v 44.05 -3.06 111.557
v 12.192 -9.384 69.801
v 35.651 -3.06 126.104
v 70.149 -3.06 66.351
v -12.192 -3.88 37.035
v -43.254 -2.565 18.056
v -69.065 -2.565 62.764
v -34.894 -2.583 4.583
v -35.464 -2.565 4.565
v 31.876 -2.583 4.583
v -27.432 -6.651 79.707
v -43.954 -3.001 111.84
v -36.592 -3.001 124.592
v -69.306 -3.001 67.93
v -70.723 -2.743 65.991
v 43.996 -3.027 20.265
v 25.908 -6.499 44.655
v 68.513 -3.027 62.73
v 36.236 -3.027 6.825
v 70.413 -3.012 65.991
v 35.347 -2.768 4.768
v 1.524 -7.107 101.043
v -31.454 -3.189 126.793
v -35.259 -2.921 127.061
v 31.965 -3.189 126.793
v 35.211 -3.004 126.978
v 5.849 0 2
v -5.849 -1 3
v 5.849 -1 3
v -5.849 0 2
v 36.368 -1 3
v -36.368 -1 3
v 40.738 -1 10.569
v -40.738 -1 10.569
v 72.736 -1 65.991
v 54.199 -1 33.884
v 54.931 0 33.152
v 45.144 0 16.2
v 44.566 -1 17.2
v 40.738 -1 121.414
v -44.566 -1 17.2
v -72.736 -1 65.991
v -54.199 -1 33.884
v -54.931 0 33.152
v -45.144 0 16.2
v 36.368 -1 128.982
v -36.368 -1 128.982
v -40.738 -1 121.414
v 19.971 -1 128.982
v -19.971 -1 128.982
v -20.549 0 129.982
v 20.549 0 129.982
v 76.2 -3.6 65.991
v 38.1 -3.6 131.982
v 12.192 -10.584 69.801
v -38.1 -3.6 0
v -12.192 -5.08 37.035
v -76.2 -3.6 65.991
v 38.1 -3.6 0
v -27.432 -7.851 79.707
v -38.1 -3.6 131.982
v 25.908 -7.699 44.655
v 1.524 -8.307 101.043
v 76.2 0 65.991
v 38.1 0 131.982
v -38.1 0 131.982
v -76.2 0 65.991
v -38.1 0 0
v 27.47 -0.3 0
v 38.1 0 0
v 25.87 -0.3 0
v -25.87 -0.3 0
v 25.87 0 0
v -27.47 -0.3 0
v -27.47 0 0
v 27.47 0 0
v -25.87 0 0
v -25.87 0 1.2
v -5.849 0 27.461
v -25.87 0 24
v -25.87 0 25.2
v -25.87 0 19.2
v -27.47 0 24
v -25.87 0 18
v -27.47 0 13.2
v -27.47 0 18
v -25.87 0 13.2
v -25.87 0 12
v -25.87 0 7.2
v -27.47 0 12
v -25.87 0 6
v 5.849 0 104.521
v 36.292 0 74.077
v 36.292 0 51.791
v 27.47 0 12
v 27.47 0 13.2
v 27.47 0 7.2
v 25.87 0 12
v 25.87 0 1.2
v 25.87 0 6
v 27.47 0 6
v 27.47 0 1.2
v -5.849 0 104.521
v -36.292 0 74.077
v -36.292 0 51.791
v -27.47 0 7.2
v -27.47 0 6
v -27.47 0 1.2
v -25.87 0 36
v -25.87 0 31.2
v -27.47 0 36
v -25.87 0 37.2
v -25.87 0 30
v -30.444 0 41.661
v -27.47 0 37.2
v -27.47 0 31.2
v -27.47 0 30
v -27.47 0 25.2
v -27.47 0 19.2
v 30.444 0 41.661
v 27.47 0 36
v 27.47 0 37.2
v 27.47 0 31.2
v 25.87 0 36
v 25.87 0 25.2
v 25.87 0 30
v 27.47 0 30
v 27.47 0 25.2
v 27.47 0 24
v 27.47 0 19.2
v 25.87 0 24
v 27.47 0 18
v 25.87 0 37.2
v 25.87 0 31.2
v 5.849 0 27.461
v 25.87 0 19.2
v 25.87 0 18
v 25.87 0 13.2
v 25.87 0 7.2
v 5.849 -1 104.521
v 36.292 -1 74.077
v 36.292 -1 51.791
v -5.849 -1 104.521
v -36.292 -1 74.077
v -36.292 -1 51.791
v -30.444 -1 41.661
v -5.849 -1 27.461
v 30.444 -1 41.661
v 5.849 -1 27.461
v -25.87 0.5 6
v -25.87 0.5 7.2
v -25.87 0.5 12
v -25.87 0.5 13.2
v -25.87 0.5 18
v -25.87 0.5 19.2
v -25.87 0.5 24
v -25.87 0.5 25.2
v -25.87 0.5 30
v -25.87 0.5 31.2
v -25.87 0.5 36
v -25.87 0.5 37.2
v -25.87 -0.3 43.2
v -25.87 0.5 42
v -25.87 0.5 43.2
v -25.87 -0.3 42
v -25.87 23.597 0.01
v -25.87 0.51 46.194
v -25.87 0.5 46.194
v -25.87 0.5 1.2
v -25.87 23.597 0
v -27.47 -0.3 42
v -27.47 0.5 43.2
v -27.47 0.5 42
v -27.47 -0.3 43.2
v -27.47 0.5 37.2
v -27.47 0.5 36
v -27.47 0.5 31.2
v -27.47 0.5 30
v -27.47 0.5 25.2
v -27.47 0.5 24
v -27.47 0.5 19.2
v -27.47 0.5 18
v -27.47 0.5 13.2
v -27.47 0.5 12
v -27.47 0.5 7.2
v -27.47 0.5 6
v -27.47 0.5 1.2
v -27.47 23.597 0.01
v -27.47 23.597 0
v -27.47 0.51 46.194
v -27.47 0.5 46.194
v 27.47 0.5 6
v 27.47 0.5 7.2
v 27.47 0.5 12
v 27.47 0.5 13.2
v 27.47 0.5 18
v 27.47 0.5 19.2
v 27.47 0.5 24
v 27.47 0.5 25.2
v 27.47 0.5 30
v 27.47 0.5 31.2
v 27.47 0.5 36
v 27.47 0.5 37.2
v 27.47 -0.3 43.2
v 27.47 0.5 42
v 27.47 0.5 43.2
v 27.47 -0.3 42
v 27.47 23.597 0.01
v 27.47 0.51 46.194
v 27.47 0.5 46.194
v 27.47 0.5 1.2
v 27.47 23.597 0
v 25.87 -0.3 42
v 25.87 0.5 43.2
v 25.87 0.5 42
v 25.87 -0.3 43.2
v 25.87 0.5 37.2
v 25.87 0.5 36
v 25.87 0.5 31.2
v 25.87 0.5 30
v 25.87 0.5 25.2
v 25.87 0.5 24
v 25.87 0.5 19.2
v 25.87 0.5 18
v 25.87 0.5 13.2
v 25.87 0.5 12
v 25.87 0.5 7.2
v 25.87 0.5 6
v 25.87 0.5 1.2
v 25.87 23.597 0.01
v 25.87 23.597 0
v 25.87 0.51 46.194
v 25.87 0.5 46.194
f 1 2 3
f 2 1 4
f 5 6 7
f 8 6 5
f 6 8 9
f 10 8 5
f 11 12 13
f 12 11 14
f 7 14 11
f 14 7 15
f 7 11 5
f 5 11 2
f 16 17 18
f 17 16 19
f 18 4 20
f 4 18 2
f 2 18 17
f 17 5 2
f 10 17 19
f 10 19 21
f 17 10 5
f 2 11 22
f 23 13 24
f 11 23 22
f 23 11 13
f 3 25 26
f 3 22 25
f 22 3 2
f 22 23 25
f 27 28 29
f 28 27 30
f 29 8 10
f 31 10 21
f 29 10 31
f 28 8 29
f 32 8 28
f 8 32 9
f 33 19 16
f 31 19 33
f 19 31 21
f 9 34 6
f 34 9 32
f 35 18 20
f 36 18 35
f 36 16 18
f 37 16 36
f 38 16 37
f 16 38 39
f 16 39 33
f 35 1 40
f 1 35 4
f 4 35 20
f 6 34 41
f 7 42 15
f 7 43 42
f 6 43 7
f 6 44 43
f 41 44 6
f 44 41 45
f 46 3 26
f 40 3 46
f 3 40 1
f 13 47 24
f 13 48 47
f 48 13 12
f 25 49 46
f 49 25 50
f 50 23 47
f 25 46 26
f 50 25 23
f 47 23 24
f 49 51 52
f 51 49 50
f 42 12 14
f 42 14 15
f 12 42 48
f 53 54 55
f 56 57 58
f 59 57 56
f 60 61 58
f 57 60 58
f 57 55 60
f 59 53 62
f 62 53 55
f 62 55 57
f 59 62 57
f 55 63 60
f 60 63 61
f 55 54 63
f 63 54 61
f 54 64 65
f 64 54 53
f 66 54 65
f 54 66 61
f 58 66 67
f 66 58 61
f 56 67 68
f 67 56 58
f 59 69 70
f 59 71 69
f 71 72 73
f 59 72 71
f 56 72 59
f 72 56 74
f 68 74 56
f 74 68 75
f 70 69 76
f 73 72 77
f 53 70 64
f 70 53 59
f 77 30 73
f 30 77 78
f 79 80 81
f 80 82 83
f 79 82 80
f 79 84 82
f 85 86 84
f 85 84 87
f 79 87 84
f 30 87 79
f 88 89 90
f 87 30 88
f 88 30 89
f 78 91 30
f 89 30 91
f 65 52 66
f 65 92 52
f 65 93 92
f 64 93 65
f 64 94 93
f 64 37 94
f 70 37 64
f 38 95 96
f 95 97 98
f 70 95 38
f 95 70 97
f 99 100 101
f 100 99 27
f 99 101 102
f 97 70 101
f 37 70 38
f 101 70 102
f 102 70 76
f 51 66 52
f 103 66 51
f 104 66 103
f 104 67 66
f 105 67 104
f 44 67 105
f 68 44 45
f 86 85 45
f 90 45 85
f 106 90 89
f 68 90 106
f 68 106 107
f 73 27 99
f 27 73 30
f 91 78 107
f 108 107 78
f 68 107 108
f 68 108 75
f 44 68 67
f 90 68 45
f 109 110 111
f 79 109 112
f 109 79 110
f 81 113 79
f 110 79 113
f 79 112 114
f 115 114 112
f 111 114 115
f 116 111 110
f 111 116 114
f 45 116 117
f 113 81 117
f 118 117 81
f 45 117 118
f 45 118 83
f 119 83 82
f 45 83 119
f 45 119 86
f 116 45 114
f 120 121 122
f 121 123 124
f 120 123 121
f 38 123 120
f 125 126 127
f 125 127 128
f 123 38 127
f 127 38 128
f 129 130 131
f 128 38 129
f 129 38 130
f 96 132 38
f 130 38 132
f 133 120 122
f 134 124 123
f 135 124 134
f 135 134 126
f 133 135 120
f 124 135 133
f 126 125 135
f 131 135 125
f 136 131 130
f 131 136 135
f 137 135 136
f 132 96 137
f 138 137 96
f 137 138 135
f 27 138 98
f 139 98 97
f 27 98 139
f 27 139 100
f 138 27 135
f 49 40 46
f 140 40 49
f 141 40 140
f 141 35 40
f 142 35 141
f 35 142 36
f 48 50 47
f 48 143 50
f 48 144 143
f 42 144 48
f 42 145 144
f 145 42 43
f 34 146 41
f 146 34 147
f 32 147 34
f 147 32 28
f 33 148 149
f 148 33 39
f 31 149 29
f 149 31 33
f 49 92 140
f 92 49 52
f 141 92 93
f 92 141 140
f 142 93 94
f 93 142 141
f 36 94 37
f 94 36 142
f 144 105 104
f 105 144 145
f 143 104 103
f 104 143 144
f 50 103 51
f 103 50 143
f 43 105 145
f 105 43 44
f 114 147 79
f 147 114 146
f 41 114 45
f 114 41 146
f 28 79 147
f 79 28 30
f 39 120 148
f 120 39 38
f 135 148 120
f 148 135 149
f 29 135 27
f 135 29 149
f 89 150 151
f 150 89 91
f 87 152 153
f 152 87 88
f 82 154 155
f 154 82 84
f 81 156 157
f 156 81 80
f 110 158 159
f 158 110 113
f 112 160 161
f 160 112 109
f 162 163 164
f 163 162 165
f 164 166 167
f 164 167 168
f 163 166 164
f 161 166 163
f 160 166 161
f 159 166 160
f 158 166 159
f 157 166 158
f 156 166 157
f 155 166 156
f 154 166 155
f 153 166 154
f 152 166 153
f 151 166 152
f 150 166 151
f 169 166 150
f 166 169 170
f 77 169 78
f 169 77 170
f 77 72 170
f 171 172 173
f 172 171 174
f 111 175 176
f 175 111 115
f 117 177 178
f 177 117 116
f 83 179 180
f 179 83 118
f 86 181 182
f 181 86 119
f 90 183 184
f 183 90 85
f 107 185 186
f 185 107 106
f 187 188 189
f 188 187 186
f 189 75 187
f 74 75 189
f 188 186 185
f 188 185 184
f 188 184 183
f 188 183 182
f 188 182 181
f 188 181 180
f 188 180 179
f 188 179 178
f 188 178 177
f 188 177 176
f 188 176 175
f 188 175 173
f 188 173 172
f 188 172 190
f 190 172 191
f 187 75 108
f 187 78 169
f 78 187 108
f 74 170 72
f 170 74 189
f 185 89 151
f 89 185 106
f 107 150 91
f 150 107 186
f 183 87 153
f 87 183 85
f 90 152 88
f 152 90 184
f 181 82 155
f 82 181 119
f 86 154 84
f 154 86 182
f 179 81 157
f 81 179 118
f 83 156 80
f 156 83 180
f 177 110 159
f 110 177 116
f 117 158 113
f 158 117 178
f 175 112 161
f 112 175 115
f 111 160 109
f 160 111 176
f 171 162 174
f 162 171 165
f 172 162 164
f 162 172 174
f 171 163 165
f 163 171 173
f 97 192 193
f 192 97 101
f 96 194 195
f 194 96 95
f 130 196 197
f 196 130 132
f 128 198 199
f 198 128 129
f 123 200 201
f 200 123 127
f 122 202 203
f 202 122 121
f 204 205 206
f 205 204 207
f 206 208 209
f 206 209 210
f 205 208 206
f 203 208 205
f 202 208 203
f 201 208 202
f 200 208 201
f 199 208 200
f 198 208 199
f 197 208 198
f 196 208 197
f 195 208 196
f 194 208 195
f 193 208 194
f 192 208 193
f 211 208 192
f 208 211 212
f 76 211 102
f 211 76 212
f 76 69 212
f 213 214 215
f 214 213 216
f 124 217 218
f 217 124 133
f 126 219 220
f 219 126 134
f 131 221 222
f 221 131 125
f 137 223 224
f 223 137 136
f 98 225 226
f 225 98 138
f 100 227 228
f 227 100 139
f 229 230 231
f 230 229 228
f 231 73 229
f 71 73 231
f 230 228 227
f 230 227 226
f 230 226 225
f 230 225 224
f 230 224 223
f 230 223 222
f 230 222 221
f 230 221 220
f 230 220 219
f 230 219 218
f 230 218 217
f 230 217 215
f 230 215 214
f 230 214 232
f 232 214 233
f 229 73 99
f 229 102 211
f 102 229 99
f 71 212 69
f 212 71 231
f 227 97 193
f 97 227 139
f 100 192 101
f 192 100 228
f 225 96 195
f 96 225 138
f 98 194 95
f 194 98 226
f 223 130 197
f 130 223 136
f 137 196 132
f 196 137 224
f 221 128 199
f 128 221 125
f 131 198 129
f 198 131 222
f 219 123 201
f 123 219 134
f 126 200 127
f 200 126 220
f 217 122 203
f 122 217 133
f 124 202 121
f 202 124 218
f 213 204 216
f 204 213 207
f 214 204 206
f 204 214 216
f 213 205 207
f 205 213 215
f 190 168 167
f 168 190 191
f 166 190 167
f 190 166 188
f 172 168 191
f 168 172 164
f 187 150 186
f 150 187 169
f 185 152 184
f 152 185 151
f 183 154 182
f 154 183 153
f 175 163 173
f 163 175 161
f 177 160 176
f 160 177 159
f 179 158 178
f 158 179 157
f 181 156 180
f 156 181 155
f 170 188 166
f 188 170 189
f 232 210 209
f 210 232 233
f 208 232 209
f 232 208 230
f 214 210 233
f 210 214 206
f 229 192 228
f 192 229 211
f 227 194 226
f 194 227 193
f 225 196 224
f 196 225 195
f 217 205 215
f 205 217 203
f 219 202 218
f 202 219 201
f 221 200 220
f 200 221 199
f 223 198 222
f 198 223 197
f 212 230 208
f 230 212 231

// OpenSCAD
// Hexagon wall tile v34 — parametric rebuild of v30
// Front: identical low-poly facets to v30 (same facet angles at every size).
// Edge profile: identical on every size (edge depth, rim width) so tiles butt flush.
// Back: six corner pads for 1" (25 mm) double-sided mounting tape.
// v32: tape pads are flat plates hung from the rim with an air gap to the front skin.
// v33: thinner skin + thinner pads so the air gap is 1.4 mm even right at the edges
//      (v32 had only 0.8 mm there and showed marks along the slanted edges).
// v34: snap-off stabilizer fins behind the bottom edge so the tall, thin tile can't tip over
//      while printing. Break them off afterwards (bend sideways) and the back stays flat.
// Prints upright on a flat edge with NO supports (every downward edge is 45° or steeper).
//
// Export one size at a time, e.g.:
//   openscad -D size_in=6 -o hex_tile_v34_6in.stl hex_wall_tile_v34.scad

/* [Size] */
size_in       = 6;      // point-to-point width in inches (3, 6, 10 ...)

/* [Edge profile — keep identical across sizes] */
// Space behind the skin at the edge = edge_depth - skin; it must be >= pad_plate + pad_gap + pad_recess.
edge_depth    = 3.6;    // depth of the outer edge, back plane to front face (mm)
rim           = 2.0;    // perimeter wall thickness at the back plane (mm)

/* [Front skin] */
skin          = 1.2;    // front skin thickness (mm) — 3 lines at 0.4 mm, same on all sizes

/* [Tape pads] */
tape_width    = 25.4;   // tape width (mm)
pad_margin    = 3;      // extra pad width beyond the tape (mm)
pad_max_frac  = 0.45;   // pad never larger than this fraction of the tile radius (keeps 3" usable)
pad_plate     = 1.0;    // thickness of the pad plates (mm)
pad_gap       = 1.4;    // minimum air gap between pads and the front skin (mm) — keeps the front clean
pad_recess    = 0;      // pads set back from the rim (mm); >0 lets the rim touch the wall,
                        // but near the edges the plate is then trimmed thinner to keep pad_gap

/* [Print stabilizers (snap off after printing)] */
stabilizers   = true;
fin_count     = 2;      // fins behind the bottom edge, placed symmetrically
fin_thick     = 1.6;    // fin thickness (mm)
fin_height_frac = 0.35; // fin height as a fraction of the tile height
fin_depth_frac  = 0.5;  // fin depth behind the tile as a fraction of fin height
fin_depth_min   = 15;   // (mm)
fin_gap       = 0.5;    // air gap between fin and tile back (mm)
tab_height    = 1.2;    // breakaway tab height (mm, vertical when printing)
tab_pitch     = 6;      // spacing between tabs (mm)

/* [Output] */
orient_for_print = true; // stand upright on a flat edge, back facing +Y

/* [Hidden] */
R   = size_in * 25.4 / 2;         // corner radius
AP  = R * cos(30);                // apothem
PAD = min(tape_width + pad_margin, R * pad_max_frac);

// Normalised front geometry from v30 (x, y in units of R; z = relief above edge, units of R)
FP = [[1,0,0],[0.5,0.866025,0],[-0.5,0.866025,0],[-1,0,0],[-0.5,-0.866025,0],[0.5,-0.866025,0],
      [0.16,0.05,0.091654],[-0.16,-0.38,0.019428],[-0.36,0.18,0.05579],[0.34,-0.28,0.053795],[0.02,0.46,0.061766]];
FACES = [[0,6,1],[4,3,7],[5,4,7],[8,3,2],[7,3,8],[7,8,6],[5,9,0],[9,6,0],[9,7,6],[5,7,9],
         [6,8,10],[8,2,10],[6,10,1],[10,2,1],
         [1,12,11,0],[2,13,12,1],[3,14,13,2],[4,15,14,3],[5,16,15,4],[0,11,16,5],
         [11,12,13,14,15,16]];
RELIEF_MAX = 0.091654 * R;
D = edge_depth + RELIEF_MAX + 1;  // max depth used for chamfers

// Solid bounded by the faceted front (shifted by dz) and a flat back at z = zb
module body(dz = 0, zb = 0) {
    pts = concat(
        [for (p = FP) [p[0]*R, p[1]*R, edge_depth + p[2]*R + dz]],
        [for (i = [0:5]) [FP[i][0]*R, FP[i][1]*R, zb]]);
    polyhedron(points = pts, faces = FACES, convexity = 4);
}

module hex2d(apothem) { circle(r = apothem / cos(30), $fn = 6); }

// Back cavity: behind the skin, inside the rim; rim inner faces slope 45° so nothing needs support
module cavity(extra = 0) {
    H  = D + 2;
    a0 = AP - rim - extra + 1;             // apothem at z = -1
    intersection() {
        body(dz = -skin - extra, zb = -1);
        translate([0, 0, -1]) linear_extrude(height = H, scale = (a0 - H) / a0) hex2d(a0);
    }
}

// Corner pad footprint (2D), k = corner index 0..5:
// the corner region of the inner hex, PAD wide, long enough to hold a PAD x PAD square of tape
module pad_core(k) {
    U0  = (AP - rim) / cos(30);                    // inner corner distance from centre
    LEN = PAD / (2 * tan(60)) + PAD + 1;           // apex taper + full square + margin
    intersection() {
        hex2d(AP - rim + 0.3);                     // overlap 0.3 mm into the rim to fuse
        rotate(60 * k) translate([U0 - LEN, -PAD / 2]) square([LEN + 5, PAD]);
    }
}

// In-plane self-support: printed upright, a vertical plate needs every downward edge at >= 45°.
// Sweep each pad toward the nearest rim side below it at 45° (or straight down for bottom corners).
SWEEP = [[1, -1], [1, -1], [-1, -1], [-1, -1], [0, -1], [0, -1]];
module pad_fp(k) {
    intersection() {
        hex2d(AP - rim + 0.3);
        hull() { pad_core(k); translate(SWEEP[k] * R) pad_core(k); }
    }
}

module pads() {
    intersection() {
        body(dz = -skin - pad_gap, zb = -1);       // never closer than pad_gap to the skin
        translate([0, 0, pad_recess]) linear_extrude(pad_plate) for (k = [0:5]) pad_fp(k);
    }
}

module tile() {
    union() {
        difference() { body(); cavity(); }
        pads();
    }
}

// Triangular fins standing on the bed behind the back (model z < 0), joined to the tile by small tabs
FIN_H = fin_height_frac * 2 * AP;
FIN_L = max(fin_depth_min, fin_depth_frac * FIN_H);
function fin_x(i) = (fin_count == 1) ? 0 : (-1 + 2 * i / (fin_count - 1)) * 0.35 * R;
module stabilizer_fins() {
    for (i = [0 : fin_count - 1]) {
        x = fin_x(i);
        hull() {                                            // fin: vertical triangle
            translate([x - fin_thick/2, -AP, -fin_gap - FIN_L]) cube([fin_thick, 0.01, FIN_L]);
            translate([x - fin_thick/2, -AP, -fin_gap - 0.01]) cube([fin_thick, FIN_H, 0.01]);
        }
        for (y = [0 : tab_pitch : FIN_H - tab_height])      // breakaway tabs into the back plane
            translate([x - fin_thick/2, -AP + y, -fin_gap - 0.05]) cube([fin_thick, tab_height, fin_gap + 0.35]);
    }
}

if (orient_for_print)
    translate([0, 0, AP]) rotate([90, 0, 0]) { tile(); if (stabilizers) stabilizer_fins(); }
else
    { tile(); if (stabilizers) stabilizer_fins(); }
